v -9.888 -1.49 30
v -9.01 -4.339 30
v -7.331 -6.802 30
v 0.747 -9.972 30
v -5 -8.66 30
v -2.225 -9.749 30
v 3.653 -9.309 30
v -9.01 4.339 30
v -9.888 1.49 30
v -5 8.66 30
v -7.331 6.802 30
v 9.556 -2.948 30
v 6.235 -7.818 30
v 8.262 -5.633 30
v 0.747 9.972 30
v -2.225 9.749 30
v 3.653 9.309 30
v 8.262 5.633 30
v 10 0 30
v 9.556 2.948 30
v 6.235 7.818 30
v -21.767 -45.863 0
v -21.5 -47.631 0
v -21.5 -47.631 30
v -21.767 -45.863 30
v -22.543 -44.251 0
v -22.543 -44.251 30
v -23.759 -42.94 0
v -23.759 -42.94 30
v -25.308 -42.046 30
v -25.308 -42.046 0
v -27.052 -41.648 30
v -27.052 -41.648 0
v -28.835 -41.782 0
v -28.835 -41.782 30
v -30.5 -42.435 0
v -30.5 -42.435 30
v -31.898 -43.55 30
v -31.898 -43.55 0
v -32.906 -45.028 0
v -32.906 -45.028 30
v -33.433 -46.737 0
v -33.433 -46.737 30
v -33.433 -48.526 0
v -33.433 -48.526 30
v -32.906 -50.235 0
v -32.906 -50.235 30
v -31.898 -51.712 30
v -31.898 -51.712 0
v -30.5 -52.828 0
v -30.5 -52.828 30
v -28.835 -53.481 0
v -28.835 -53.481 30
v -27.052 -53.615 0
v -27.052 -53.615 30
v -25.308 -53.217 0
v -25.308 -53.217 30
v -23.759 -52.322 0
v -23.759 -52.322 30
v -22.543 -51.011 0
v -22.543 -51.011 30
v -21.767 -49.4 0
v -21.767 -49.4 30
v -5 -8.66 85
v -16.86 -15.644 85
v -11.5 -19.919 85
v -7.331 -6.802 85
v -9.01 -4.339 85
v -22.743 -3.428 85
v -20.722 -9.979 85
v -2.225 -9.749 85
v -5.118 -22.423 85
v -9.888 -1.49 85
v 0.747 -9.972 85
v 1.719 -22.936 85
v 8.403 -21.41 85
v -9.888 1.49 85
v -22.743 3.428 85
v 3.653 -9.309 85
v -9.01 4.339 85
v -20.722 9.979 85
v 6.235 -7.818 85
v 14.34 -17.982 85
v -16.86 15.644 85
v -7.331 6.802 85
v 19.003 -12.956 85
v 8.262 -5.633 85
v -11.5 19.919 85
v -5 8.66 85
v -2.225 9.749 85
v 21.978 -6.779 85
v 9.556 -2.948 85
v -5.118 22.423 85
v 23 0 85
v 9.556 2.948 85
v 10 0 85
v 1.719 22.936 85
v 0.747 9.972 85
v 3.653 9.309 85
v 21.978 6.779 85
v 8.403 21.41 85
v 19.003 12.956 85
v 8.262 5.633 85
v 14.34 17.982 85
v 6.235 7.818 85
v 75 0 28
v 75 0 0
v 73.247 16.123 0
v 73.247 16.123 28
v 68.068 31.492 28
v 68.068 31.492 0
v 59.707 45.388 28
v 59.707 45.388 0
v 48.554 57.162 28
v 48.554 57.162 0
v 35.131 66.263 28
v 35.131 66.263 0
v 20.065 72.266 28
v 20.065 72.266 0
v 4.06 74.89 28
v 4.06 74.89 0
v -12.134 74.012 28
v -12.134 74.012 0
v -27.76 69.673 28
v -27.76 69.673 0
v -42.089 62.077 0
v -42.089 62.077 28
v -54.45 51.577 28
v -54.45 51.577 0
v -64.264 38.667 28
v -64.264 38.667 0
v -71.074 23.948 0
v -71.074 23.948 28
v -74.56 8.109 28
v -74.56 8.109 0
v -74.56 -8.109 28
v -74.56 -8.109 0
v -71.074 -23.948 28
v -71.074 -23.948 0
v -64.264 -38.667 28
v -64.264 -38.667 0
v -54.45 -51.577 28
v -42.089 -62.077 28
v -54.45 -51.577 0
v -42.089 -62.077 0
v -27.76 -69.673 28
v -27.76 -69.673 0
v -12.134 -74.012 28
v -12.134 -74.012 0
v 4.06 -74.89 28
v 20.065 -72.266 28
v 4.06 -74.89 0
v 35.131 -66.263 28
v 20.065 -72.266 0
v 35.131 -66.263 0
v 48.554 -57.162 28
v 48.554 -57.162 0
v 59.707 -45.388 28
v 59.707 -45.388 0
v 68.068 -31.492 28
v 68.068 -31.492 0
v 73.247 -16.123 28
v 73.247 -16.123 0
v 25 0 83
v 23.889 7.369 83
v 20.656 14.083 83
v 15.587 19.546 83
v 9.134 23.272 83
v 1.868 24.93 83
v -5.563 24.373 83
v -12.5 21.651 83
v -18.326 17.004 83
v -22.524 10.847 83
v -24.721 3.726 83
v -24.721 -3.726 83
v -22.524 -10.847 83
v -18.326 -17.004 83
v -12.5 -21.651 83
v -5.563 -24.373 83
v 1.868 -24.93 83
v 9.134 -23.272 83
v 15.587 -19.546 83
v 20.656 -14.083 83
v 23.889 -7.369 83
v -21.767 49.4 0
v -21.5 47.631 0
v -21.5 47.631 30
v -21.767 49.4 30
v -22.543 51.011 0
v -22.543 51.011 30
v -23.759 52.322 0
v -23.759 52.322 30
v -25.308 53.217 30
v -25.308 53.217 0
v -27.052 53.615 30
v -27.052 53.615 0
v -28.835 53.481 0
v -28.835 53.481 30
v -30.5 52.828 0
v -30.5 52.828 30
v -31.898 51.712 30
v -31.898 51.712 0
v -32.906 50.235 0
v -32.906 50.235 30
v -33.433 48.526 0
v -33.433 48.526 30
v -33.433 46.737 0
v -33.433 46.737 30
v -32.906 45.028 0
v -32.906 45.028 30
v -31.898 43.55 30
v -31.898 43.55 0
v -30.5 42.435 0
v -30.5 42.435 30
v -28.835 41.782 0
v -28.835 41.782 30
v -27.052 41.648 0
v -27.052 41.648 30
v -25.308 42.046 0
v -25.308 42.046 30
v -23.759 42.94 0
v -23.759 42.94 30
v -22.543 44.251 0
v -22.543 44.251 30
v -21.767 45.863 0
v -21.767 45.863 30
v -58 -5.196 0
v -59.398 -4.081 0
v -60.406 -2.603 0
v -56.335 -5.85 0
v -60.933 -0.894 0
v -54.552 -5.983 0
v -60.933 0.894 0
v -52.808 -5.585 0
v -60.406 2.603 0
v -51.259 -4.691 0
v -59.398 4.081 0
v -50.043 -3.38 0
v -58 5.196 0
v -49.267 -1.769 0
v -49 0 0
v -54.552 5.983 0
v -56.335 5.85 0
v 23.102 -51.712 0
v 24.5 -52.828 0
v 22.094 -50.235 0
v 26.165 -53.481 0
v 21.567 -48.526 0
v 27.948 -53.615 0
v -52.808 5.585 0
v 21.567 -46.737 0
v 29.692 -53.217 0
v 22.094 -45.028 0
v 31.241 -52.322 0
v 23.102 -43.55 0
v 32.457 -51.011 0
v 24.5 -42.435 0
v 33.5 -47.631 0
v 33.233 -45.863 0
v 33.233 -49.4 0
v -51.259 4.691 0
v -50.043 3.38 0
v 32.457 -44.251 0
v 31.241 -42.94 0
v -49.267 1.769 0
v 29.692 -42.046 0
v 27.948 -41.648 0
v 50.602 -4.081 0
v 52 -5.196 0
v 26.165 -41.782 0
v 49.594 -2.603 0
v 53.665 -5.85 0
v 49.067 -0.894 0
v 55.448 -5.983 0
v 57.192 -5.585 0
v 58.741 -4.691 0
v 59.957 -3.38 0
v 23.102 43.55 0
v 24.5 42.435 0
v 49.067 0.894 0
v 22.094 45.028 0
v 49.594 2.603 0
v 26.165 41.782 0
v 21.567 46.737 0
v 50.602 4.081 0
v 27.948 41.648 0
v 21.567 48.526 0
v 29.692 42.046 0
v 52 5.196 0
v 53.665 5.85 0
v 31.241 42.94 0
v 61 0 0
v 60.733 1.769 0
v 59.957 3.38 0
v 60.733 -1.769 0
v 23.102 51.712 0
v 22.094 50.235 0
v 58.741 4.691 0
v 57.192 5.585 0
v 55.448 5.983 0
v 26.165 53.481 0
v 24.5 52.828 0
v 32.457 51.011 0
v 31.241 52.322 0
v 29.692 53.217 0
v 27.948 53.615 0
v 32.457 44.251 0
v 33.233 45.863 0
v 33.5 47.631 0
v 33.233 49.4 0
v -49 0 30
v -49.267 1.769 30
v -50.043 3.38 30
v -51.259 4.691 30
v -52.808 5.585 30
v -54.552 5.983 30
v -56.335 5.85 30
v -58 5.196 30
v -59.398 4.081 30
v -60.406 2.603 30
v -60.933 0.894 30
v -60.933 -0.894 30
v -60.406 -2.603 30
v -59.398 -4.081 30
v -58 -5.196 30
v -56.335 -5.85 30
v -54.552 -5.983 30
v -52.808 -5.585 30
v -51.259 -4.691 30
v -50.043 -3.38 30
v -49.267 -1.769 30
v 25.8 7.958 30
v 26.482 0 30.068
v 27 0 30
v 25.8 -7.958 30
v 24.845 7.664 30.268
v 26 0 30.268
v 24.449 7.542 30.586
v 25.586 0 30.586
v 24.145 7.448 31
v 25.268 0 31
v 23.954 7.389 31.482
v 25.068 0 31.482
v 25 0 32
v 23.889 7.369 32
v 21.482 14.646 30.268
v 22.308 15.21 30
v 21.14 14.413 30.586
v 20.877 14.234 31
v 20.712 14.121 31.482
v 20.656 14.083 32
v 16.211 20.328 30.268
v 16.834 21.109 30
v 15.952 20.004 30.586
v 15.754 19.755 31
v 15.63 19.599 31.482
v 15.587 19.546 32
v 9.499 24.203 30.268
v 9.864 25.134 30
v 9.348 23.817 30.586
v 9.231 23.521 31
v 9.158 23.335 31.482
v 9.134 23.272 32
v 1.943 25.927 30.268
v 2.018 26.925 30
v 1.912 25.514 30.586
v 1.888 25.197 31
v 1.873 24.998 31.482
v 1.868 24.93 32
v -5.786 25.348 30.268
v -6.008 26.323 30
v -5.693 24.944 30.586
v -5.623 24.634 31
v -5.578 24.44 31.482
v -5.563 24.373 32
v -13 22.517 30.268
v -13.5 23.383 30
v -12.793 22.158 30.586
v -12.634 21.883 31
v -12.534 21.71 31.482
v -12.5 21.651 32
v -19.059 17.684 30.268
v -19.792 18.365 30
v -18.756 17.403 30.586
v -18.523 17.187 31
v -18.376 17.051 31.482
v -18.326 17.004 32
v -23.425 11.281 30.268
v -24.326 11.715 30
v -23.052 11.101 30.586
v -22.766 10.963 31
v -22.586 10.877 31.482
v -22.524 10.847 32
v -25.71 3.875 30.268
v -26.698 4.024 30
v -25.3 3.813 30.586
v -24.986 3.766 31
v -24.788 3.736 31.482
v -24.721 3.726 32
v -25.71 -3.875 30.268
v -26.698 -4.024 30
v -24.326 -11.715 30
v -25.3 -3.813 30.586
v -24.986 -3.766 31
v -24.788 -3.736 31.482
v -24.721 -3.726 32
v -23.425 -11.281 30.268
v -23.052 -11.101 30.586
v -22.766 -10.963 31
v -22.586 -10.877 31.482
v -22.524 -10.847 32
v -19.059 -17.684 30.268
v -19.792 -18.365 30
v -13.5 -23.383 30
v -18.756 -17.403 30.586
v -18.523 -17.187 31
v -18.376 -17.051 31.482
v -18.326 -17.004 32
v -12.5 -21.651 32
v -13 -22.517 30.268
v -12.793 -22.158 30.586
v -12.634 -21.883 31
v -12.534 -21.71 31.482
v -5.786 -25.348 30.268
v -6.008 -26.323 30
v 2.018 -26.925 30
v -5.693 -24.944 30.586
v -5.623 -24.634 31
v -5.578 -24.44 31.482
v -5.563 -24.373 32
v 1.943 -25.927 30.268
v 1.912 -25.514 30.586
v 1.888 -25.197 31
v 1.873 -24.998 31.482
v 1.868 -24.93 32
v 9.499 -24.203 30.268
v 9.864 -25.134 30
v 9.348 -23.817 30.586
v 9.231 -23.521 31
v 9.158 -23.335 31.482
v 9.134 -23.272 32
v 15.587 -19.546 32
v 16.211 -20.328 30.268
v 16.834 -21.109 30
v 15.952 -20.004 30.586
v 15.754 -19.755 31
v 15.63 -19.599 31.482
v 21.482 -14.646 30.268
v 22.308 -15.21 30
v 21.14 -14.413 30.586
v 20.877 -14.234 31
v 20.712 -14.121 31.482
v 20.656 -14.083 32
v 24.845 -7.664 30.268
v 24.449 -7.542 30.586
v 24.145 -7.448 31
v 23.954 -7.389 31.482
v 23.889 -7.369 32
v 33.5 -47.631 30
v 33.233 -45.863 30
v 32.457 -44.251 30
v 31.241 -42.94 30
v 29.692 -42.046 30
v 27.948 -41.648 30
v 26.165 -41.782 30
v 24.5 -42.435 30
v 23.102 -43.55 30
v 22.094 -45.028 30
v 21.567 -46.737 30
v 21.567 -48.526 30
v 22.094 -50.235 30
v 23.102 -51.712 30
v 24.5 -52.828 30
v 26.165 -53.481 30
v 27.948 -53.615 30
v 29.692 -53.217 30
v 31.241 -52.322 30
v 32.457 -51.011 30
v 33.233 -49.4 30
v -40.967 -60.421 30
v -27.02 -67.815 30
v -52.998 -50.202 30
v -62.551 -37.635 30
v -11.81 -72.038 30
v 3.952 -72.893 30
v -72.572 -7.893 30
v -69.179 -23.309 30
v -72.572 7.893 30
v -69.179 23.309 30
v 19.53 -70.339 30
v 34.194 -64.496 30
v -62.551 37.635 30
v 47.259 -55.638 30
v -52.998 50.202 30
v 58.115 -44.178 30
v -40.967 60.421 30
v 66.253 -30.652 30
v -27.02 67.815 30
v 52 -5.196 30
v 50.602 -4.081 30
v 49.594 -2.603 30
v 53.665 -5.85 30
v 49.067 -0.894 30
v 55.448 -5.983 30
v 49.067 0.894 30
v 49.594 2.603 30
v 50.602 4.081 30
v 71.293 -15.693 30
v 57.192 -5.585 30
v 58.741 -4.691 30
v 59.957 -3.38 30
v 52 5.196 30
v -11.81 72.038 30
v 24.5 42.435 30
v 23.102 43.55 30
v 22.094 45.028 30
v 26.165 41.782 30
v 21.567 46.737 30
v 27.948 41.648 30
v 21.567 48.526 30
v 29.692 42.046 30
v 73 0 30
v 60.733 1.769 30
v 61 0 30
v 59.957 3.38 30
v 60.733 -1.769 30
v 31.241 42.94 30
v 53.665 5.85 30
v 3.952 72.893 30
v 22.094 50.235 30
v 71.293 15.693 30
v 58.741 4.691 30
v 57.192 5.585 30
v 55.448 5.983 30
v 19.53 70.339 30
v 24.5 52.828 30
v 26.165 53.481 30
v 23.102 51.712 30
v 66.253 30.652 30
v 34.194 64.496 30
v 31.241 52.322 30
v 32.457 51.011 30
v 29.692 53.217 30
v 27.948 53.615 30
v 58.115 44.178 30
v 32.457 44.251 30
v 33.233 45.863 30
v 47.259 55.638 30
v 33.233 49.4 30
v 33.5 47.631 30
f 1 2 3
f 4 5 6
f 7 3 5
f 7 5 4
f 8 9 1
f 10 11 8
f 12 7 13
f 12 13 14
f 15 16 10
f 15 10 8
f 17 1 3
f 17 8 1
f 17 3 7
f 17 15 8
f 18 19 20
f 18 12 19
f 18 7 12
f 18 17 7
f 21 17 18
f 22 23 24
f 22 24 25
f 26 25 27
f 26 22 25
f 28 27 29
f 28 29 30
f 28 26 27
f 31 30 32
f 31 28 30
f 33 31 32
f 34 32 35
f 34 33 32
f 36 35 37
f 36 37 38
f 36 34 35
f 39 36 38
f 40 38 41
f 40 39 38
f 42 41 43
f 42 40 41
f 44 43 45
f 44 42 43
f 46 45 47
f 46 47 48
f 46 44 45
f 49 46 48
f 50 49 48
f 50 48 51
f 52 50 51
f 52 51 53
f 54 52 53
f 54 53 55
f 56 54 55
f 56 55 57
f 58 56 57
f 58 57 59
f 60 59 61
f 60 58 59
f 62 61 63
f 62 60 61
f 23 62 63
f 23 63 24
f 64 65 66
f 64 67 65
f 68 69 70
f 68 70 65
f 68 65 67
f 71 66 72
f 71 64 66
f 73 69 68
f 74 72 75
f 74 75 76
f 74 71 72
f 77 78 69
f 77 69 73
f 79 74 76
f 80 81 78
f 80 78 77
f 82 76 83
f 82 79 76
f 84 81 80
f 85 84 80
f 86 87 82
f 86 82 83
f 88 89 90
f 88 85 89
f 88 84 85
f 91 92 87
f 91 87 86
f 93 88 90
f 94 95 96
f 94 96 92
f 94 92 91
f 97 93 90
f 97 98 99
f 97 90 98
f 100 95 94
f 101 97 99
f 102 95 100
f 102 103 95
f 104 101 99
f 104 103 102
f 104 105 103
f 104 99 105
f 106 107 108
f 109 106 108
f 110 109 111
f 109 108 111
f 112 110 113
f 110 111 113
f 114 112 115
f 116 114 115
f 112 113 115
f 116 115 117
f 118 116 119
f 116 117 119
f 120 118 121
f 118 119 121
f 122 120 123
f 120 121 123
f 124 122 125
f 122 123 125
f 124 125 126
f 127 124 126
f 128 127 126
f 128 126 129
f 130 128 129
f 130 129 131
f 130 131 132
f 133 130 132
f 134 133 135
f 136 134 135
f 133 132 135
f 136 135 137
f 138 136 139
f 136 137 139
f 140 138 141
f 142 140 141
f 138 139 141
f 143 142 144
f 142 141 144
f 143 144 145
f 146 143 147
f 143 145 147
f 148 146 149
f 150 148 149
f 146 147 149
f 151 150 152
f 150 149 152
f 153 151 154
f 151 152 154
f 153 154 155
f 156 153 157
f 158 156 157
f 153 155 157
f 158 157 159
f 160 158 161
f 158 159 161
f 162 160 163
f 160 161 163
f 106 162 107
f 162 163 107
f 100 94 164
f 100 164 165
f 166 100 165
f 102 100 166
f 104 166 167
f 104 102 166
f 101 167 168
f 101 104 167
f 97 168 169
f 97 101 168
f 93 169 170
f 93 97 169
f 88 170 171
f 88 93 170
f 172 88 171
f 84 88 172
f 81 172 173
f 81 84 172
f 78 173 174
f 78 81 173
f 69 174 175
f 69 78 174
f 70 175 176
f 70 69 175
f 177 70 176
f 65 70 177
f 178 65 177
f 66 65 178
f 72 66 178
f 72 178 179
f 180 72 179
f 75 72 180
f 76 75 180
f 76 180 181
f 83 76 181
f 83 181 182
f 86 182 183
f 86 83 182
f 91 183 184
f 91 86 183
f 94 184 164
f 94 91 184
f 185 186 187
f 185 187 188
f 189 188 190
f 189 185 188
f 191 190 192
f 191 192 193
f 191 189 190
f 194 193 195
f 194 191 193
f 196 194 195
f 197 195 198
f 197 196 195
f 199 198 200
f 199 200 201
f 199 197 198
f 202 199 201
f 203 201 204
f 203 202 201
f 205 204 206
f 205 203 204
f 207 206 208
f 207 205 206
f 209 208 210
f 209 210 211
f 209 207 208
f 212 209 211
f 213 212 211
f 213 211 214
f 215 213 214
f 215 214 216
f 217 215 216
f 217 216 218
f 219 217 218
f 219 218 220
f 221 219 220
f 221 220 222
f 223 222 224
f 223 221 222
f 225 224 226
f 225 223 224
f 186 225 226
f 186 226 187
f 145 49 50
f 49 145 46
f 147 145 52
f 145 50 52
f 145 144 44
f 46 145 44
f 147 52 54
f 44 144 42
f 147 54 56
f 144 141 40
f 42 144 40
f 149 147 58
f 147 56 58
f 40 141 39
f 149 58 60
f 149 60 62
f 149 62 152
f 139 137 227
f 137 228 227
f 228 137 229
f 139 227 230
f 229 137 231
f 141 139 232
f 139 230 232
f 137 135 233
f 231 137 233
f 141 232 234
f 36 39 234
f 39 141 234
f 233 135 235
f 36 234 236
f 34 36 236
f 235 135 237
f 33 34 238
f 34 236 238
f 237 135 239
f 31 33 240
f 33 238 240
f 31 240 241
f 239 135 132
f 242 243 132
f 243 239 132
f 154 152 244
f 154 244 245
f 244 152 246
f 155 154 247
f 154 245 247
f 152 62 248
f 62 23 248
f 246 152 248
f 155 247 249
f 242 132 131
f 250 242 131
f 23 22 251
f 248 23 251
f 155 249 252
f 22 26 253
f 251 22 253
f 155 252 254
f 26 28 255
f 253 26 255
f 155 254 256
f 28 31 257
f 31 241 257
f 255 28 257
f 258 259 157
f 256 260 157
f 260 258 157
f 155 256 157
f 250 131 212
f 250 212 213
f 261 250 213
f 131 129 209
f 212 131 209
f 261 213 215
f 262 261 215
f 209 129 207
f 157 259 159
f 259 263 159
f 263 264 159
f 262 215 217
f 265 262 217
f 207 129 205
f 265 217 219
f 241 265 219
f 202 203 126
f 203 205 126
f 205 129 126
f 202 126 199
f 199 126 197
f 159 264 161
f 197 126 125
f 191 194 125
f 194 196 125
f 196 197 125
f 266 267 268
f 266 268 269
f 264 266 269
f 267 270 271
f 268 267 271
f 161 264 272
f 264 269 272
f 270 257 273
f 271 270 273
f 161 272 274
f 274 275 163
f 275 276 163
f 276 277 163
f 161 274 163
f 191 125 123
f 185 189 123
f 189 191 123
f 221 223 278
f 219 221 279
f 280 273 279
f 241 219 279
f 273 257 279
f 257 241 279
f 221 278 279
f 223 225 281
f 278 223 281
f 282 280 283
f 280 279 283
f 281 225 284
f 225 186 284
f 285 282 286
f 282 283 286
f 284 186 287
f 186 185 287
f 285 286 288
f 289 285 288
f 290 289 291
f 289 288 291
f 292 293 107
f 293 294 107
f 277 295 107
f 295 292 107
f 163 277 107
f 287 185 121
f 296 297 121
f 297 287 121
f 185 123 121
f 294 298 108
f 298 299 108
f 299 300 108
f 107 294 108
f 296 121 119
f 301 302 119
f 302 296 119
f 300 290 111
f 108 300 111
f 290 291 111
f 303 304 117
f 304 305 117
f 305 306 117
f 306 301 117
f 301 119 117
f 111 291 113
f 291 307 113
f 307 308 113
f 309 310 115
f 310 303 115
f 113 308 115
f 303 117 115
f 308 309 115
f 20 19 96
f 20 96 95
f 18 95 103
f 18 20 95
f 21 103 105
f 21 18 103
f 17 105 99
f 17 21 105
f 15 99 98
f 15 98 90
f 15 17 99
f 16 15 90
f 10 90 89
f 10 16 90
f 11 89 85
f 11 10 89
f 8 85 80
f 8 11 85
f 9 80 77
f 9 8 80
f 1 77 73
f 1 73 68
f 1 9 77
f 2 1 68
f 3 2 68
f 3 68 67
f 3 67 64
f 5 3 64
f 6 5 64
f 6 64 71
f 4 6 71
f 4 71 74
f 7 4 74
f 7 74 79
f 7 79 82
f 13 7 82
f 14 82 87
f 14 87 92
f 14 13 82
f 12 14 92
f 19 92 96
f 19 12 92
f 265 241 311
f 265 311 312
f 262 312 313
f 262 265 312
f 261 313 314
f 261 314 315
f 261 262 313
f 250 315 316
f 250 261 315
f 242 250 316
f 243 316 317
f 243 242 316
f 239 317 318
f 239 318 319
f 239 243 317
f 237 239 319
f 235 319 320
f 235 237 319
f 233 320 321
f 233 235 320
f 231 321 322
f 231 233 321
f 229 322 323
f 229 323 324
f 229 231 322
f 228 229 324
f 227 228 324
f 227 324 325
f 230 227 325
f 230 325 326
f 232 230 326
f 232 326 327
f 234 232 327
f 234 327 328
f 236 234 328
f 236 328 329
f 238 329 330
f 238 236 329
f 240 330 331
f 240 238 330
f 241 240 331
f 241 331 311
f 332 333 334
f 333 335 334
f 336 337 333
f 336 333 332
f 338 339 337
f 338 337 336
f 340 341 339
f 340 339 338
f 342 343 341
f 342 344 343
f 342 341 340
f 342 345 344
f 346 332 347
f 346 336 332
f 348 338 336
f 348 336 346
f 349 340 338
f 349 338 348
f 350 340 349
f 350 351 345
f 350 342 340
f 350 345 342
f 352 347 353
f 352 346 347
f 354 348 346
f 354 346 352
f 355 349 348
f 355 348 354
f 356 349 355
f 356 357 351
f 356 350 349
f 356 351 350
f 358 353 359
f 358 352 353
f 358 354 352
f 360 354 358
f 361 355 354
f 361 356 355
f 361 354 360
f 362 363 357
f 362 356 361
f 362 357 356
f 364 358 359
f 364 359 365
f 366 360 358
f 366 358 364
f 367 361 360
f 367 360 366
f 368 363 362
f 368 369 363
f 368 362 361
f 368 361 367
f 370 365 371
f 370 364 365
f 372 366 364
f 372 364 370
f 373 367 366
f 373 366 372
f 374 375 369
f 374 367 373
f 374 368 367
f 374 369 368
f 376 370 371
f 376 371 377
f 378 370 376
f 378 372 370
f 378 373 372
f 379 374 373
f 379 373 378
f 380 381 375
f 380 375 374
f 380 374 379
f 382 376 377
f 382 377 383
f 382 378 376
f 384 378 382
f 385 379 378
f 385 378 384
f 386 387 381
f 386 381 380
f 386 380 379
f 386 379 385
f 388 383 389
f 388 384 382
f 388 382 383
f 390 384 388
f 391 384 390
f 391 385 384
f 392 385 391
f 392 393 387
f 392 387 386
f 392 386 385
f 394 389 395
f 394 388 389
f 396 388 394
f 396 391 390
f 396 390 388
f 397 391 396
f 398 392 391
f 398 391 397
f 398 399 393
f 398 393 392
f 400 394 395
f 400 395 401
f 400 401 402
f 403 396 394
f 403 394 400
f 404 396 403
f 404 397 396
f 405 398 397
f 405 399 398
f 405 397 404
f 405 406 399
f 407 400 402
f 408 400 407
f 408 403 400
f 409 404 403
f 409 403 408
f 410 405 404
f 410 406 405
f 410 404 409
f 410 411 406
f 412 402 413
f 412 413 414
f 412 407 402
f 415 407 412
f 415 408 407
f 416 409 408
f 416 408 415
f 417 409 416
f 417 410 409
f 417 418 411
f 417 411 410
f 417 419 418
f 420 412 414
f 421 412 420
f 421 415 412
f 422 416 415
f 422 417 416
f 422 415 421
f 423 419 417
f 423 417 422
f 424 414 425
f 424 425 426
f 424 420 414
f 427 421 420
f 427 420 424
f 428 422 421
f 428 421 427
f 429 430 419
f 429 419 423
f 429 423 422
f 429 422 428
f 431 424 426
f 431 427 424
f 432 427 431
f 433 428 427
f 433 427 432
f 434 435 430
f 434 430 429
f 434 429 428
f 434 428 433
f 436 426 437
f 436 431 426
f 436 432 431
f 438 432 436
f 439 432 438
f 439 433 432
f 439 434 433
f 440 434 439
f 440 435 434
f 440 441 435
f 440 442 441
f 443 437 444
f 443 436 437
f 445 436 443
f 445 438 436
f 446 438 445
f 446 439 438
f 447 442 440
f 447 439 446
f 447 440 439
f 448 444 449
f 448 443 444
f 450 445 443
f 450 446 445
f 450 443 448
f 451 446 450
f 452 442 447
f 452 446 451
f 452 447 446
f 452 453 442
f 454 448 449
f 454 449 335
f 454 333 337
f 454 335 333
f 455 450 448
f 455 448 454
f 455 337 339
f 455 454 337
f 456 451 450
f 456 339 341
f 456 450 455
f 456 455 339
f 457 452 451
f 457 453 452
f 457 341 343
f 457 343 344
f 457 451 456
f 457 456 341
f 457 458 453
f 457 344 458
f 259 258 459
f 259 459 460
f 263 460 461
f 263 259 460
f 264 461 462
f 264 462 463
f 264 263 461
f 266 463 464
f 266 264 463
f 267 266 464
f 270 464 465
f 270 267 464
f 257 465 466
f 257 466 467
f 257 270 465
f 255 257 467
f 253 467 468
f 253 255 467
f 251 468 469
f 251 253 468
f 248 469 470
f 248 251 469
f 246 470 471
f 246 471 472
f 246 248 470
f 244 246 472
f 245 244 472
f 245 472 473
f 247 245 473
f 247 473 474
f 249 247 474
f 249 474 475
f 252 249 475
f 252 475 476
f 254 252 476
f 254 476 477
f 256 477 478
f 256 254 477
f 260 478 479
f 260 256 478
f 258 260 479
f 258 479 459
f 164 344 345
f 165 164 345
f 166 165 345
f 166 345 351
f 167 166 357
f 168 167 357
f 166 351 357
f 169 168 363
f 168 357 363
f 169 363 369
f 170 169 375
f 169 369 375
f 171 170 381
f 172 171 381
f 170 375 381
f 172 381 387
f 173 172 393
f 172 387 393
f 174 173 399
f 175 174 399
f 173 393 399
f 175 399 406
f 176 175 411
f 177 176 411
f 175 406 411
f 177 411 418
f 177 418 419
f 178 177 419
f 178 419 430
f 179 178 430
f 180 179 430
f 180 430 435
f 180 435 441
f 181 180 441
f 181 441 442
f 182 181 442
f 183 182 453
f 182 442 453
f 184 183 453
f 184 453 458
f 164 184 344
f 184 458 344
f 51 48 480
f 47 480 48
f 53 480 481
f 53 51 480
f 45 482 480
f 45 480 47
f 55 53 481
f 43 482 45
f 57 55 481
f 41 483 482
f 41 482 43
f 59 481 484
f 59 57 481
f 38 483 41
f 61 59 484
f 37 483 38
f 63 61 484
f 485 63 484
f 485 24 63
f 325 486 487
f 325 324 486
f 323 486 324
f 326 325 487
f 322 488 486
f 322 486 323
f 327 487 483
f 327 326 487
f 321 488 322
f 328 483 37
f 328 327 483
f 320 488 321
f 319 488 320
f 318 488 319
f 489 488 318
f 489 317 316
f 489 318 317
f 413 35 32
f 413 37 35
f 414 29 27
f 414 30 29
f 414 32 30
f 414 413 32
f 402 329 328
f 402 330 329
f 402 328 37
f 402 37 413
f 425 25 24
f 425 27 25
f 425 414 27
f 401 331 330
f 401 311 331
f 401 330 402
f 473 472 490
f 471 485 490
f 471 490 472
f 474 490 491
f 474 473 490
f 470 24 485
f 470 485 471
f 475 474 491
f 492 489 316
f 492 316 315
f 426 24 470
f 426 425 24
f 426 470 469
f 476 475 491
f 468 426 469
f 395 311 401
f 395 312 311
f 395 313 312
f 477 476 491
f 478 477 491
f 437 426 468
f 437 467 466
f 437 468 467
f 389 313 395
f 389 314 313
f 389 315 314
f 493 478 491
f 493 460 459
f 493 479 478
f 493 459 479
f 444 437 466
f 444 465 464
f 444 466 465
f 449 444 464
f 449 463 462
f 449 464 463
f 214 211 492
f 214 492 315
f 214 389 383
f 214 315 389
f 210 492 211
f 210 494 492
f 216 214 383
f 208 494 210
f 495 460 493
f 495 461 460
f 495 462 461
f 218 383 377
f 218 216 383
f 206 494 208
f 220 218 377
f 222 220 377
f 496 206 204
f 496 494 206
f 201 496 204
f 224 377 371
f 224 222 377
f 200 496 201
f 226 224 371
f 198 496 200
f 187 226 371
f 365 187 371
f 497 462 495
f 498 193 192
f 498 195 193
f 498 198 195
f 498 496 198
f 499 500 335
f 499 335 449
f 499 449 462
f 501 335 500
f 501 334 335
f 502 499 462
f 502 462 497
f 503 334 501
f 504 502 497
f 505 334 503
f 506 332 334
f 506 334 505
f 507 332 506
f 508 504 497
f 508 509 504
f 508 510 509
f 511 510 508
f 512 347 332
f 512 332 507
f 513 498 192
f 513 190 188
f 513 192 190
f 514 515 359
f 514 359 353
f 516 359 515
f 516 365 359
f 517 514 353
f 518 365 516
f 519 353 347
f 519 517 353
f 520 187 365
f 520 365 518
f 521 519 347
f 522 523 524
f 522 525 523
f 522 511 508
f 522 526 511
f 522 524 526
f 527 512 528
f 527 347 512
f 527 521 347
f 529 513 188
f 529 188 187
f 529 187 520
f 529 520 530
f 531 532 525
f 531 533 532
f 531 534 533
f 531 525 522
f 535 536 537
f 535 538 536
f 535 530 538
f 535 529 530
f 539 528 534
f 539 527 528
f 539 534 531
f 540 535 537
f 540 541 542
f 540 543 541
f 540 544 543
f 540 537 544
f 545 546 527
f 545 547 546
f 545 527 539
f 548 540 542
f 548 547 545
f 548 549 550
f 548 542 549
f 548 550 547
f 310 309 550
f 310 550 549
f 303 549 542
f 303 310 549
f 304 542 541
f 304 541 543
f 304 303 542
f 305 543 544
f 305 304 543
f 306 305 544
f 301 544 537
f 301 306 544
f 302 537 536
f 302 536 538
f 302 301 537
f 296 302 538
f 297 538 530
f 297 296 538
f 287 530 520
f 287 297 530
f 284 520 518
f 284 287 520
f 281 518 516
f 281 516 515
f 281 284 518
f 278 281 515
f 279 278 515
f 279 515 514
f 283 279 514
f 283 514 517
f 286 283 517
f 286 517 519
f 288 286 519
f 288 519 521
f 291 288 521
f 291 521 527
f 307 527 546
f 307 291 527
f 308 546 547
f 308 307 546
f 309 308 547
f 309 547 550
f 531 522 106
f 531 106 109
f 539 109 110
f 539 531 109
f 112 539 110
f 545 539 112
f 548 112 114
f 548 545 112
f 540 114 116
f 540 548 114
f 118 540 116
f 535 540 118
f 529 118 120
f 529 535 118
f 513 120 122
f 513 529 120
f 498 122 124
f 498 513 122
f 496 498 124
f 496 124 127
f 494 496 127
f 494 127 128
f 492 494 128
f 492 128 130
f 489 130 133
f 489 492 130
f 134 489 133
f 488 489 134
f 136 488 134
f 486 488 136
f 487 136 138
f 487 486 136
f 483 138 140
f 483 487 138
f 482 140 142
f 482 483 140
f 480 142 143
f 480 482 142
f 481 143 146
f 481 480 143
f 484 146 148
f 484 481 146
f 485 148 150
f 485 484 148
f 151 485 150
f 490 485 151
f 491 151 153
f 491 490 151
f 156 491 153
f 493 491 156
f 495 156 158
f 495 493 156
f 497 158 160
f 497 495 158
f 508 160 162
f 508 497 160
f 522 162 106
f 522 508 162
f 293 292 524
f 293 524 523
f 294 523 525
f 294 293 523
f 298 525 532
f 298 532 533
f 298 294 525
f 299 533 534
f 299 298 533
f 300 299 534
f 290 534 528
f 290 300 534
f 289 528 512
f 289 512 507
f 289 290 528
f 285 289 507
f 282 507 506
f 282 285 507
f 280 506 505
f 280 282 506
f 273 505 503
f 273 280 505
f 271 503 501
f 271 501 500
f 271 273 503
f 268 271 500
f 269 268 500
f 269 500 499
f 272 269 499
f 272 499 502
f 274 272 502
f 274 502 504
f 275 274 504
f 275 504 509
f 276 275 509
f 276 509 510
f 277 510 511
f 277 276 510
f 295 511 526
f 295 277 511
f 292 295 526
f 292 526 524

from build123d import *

# Parameters (mm, degrees)
SKETCH_1_R      = 75
SKETCH_1_R_2    = 6
EXTRUDE_1_DEPTH = 30
SKETCH_2_R      = 25
SKETCH_2_R_2    = 10
EXTRUDE_2_DEPTH = 55
CHAMFER_1_SIZE  = 2
FILLET_1_R      = 2


with BuildPart() as part:
    # 草图1 → 凸台-拉伸1 (new body)
    with BuildSketch(Plane.XY):
        Circle(SKETCH_1_R)
        with Locations((-55, 0)):
            Circle(SKETCH_1_R_2, mode=Mode.SUBTRACT)
        with Locations((-27.5, 47.631397208)):
            Circle(SKETCH_1_R_2, mode=Mode.SUBTRACT)
        with Locations((27.5, 47.631397208)):
            Circle(SKETCH_1_R_2, mode=Mode.SUBTRACT)
        with Locations((55, 0)):
            Circle(SKETCH_1_R_2, mode=Mode.SUBTRACT)
        with Locations((27.5, -47.631397208)):
            Circle(SKETCH_1_R_2, mode=Mode.SUBTRACT)
        with Locations((-27.5, -47.631397208)):
            Circle(SKETCH_1_R_2, mode=Mode.SUBTRACT)
    extrude(amount=EXTRUDE_1_DEPTH)

    # 草图2 → 凸台-拉伸2 (add)
    with BuildSketch(Plane.XY.offset(30)):
        Circle(SKETCH_2_R)
        Circle(SKETCH_2_R_2, mode=Mode.SUBTRACT)
    extrude(amount=EXTRUDE_2_DEPTH)

    # 倒角1
    chamfer_1_edges = [part.edges().sort_by_distance(p)[0] for p in [
        (-25, 0, 85),
        (-75, 0, 30),
    ]]
    chamfer(chamfer_1_edges, length=CHAMFER_1_SIZE)

    # 圆角1
    fillet_1_edges = [part.edges().sort_by_distance(p)[0] for p in [
        (-25, 0, 30),
    ]]
    fillet(fillet_1_edges, radius=FILLET_1_R)


solid = part.part
